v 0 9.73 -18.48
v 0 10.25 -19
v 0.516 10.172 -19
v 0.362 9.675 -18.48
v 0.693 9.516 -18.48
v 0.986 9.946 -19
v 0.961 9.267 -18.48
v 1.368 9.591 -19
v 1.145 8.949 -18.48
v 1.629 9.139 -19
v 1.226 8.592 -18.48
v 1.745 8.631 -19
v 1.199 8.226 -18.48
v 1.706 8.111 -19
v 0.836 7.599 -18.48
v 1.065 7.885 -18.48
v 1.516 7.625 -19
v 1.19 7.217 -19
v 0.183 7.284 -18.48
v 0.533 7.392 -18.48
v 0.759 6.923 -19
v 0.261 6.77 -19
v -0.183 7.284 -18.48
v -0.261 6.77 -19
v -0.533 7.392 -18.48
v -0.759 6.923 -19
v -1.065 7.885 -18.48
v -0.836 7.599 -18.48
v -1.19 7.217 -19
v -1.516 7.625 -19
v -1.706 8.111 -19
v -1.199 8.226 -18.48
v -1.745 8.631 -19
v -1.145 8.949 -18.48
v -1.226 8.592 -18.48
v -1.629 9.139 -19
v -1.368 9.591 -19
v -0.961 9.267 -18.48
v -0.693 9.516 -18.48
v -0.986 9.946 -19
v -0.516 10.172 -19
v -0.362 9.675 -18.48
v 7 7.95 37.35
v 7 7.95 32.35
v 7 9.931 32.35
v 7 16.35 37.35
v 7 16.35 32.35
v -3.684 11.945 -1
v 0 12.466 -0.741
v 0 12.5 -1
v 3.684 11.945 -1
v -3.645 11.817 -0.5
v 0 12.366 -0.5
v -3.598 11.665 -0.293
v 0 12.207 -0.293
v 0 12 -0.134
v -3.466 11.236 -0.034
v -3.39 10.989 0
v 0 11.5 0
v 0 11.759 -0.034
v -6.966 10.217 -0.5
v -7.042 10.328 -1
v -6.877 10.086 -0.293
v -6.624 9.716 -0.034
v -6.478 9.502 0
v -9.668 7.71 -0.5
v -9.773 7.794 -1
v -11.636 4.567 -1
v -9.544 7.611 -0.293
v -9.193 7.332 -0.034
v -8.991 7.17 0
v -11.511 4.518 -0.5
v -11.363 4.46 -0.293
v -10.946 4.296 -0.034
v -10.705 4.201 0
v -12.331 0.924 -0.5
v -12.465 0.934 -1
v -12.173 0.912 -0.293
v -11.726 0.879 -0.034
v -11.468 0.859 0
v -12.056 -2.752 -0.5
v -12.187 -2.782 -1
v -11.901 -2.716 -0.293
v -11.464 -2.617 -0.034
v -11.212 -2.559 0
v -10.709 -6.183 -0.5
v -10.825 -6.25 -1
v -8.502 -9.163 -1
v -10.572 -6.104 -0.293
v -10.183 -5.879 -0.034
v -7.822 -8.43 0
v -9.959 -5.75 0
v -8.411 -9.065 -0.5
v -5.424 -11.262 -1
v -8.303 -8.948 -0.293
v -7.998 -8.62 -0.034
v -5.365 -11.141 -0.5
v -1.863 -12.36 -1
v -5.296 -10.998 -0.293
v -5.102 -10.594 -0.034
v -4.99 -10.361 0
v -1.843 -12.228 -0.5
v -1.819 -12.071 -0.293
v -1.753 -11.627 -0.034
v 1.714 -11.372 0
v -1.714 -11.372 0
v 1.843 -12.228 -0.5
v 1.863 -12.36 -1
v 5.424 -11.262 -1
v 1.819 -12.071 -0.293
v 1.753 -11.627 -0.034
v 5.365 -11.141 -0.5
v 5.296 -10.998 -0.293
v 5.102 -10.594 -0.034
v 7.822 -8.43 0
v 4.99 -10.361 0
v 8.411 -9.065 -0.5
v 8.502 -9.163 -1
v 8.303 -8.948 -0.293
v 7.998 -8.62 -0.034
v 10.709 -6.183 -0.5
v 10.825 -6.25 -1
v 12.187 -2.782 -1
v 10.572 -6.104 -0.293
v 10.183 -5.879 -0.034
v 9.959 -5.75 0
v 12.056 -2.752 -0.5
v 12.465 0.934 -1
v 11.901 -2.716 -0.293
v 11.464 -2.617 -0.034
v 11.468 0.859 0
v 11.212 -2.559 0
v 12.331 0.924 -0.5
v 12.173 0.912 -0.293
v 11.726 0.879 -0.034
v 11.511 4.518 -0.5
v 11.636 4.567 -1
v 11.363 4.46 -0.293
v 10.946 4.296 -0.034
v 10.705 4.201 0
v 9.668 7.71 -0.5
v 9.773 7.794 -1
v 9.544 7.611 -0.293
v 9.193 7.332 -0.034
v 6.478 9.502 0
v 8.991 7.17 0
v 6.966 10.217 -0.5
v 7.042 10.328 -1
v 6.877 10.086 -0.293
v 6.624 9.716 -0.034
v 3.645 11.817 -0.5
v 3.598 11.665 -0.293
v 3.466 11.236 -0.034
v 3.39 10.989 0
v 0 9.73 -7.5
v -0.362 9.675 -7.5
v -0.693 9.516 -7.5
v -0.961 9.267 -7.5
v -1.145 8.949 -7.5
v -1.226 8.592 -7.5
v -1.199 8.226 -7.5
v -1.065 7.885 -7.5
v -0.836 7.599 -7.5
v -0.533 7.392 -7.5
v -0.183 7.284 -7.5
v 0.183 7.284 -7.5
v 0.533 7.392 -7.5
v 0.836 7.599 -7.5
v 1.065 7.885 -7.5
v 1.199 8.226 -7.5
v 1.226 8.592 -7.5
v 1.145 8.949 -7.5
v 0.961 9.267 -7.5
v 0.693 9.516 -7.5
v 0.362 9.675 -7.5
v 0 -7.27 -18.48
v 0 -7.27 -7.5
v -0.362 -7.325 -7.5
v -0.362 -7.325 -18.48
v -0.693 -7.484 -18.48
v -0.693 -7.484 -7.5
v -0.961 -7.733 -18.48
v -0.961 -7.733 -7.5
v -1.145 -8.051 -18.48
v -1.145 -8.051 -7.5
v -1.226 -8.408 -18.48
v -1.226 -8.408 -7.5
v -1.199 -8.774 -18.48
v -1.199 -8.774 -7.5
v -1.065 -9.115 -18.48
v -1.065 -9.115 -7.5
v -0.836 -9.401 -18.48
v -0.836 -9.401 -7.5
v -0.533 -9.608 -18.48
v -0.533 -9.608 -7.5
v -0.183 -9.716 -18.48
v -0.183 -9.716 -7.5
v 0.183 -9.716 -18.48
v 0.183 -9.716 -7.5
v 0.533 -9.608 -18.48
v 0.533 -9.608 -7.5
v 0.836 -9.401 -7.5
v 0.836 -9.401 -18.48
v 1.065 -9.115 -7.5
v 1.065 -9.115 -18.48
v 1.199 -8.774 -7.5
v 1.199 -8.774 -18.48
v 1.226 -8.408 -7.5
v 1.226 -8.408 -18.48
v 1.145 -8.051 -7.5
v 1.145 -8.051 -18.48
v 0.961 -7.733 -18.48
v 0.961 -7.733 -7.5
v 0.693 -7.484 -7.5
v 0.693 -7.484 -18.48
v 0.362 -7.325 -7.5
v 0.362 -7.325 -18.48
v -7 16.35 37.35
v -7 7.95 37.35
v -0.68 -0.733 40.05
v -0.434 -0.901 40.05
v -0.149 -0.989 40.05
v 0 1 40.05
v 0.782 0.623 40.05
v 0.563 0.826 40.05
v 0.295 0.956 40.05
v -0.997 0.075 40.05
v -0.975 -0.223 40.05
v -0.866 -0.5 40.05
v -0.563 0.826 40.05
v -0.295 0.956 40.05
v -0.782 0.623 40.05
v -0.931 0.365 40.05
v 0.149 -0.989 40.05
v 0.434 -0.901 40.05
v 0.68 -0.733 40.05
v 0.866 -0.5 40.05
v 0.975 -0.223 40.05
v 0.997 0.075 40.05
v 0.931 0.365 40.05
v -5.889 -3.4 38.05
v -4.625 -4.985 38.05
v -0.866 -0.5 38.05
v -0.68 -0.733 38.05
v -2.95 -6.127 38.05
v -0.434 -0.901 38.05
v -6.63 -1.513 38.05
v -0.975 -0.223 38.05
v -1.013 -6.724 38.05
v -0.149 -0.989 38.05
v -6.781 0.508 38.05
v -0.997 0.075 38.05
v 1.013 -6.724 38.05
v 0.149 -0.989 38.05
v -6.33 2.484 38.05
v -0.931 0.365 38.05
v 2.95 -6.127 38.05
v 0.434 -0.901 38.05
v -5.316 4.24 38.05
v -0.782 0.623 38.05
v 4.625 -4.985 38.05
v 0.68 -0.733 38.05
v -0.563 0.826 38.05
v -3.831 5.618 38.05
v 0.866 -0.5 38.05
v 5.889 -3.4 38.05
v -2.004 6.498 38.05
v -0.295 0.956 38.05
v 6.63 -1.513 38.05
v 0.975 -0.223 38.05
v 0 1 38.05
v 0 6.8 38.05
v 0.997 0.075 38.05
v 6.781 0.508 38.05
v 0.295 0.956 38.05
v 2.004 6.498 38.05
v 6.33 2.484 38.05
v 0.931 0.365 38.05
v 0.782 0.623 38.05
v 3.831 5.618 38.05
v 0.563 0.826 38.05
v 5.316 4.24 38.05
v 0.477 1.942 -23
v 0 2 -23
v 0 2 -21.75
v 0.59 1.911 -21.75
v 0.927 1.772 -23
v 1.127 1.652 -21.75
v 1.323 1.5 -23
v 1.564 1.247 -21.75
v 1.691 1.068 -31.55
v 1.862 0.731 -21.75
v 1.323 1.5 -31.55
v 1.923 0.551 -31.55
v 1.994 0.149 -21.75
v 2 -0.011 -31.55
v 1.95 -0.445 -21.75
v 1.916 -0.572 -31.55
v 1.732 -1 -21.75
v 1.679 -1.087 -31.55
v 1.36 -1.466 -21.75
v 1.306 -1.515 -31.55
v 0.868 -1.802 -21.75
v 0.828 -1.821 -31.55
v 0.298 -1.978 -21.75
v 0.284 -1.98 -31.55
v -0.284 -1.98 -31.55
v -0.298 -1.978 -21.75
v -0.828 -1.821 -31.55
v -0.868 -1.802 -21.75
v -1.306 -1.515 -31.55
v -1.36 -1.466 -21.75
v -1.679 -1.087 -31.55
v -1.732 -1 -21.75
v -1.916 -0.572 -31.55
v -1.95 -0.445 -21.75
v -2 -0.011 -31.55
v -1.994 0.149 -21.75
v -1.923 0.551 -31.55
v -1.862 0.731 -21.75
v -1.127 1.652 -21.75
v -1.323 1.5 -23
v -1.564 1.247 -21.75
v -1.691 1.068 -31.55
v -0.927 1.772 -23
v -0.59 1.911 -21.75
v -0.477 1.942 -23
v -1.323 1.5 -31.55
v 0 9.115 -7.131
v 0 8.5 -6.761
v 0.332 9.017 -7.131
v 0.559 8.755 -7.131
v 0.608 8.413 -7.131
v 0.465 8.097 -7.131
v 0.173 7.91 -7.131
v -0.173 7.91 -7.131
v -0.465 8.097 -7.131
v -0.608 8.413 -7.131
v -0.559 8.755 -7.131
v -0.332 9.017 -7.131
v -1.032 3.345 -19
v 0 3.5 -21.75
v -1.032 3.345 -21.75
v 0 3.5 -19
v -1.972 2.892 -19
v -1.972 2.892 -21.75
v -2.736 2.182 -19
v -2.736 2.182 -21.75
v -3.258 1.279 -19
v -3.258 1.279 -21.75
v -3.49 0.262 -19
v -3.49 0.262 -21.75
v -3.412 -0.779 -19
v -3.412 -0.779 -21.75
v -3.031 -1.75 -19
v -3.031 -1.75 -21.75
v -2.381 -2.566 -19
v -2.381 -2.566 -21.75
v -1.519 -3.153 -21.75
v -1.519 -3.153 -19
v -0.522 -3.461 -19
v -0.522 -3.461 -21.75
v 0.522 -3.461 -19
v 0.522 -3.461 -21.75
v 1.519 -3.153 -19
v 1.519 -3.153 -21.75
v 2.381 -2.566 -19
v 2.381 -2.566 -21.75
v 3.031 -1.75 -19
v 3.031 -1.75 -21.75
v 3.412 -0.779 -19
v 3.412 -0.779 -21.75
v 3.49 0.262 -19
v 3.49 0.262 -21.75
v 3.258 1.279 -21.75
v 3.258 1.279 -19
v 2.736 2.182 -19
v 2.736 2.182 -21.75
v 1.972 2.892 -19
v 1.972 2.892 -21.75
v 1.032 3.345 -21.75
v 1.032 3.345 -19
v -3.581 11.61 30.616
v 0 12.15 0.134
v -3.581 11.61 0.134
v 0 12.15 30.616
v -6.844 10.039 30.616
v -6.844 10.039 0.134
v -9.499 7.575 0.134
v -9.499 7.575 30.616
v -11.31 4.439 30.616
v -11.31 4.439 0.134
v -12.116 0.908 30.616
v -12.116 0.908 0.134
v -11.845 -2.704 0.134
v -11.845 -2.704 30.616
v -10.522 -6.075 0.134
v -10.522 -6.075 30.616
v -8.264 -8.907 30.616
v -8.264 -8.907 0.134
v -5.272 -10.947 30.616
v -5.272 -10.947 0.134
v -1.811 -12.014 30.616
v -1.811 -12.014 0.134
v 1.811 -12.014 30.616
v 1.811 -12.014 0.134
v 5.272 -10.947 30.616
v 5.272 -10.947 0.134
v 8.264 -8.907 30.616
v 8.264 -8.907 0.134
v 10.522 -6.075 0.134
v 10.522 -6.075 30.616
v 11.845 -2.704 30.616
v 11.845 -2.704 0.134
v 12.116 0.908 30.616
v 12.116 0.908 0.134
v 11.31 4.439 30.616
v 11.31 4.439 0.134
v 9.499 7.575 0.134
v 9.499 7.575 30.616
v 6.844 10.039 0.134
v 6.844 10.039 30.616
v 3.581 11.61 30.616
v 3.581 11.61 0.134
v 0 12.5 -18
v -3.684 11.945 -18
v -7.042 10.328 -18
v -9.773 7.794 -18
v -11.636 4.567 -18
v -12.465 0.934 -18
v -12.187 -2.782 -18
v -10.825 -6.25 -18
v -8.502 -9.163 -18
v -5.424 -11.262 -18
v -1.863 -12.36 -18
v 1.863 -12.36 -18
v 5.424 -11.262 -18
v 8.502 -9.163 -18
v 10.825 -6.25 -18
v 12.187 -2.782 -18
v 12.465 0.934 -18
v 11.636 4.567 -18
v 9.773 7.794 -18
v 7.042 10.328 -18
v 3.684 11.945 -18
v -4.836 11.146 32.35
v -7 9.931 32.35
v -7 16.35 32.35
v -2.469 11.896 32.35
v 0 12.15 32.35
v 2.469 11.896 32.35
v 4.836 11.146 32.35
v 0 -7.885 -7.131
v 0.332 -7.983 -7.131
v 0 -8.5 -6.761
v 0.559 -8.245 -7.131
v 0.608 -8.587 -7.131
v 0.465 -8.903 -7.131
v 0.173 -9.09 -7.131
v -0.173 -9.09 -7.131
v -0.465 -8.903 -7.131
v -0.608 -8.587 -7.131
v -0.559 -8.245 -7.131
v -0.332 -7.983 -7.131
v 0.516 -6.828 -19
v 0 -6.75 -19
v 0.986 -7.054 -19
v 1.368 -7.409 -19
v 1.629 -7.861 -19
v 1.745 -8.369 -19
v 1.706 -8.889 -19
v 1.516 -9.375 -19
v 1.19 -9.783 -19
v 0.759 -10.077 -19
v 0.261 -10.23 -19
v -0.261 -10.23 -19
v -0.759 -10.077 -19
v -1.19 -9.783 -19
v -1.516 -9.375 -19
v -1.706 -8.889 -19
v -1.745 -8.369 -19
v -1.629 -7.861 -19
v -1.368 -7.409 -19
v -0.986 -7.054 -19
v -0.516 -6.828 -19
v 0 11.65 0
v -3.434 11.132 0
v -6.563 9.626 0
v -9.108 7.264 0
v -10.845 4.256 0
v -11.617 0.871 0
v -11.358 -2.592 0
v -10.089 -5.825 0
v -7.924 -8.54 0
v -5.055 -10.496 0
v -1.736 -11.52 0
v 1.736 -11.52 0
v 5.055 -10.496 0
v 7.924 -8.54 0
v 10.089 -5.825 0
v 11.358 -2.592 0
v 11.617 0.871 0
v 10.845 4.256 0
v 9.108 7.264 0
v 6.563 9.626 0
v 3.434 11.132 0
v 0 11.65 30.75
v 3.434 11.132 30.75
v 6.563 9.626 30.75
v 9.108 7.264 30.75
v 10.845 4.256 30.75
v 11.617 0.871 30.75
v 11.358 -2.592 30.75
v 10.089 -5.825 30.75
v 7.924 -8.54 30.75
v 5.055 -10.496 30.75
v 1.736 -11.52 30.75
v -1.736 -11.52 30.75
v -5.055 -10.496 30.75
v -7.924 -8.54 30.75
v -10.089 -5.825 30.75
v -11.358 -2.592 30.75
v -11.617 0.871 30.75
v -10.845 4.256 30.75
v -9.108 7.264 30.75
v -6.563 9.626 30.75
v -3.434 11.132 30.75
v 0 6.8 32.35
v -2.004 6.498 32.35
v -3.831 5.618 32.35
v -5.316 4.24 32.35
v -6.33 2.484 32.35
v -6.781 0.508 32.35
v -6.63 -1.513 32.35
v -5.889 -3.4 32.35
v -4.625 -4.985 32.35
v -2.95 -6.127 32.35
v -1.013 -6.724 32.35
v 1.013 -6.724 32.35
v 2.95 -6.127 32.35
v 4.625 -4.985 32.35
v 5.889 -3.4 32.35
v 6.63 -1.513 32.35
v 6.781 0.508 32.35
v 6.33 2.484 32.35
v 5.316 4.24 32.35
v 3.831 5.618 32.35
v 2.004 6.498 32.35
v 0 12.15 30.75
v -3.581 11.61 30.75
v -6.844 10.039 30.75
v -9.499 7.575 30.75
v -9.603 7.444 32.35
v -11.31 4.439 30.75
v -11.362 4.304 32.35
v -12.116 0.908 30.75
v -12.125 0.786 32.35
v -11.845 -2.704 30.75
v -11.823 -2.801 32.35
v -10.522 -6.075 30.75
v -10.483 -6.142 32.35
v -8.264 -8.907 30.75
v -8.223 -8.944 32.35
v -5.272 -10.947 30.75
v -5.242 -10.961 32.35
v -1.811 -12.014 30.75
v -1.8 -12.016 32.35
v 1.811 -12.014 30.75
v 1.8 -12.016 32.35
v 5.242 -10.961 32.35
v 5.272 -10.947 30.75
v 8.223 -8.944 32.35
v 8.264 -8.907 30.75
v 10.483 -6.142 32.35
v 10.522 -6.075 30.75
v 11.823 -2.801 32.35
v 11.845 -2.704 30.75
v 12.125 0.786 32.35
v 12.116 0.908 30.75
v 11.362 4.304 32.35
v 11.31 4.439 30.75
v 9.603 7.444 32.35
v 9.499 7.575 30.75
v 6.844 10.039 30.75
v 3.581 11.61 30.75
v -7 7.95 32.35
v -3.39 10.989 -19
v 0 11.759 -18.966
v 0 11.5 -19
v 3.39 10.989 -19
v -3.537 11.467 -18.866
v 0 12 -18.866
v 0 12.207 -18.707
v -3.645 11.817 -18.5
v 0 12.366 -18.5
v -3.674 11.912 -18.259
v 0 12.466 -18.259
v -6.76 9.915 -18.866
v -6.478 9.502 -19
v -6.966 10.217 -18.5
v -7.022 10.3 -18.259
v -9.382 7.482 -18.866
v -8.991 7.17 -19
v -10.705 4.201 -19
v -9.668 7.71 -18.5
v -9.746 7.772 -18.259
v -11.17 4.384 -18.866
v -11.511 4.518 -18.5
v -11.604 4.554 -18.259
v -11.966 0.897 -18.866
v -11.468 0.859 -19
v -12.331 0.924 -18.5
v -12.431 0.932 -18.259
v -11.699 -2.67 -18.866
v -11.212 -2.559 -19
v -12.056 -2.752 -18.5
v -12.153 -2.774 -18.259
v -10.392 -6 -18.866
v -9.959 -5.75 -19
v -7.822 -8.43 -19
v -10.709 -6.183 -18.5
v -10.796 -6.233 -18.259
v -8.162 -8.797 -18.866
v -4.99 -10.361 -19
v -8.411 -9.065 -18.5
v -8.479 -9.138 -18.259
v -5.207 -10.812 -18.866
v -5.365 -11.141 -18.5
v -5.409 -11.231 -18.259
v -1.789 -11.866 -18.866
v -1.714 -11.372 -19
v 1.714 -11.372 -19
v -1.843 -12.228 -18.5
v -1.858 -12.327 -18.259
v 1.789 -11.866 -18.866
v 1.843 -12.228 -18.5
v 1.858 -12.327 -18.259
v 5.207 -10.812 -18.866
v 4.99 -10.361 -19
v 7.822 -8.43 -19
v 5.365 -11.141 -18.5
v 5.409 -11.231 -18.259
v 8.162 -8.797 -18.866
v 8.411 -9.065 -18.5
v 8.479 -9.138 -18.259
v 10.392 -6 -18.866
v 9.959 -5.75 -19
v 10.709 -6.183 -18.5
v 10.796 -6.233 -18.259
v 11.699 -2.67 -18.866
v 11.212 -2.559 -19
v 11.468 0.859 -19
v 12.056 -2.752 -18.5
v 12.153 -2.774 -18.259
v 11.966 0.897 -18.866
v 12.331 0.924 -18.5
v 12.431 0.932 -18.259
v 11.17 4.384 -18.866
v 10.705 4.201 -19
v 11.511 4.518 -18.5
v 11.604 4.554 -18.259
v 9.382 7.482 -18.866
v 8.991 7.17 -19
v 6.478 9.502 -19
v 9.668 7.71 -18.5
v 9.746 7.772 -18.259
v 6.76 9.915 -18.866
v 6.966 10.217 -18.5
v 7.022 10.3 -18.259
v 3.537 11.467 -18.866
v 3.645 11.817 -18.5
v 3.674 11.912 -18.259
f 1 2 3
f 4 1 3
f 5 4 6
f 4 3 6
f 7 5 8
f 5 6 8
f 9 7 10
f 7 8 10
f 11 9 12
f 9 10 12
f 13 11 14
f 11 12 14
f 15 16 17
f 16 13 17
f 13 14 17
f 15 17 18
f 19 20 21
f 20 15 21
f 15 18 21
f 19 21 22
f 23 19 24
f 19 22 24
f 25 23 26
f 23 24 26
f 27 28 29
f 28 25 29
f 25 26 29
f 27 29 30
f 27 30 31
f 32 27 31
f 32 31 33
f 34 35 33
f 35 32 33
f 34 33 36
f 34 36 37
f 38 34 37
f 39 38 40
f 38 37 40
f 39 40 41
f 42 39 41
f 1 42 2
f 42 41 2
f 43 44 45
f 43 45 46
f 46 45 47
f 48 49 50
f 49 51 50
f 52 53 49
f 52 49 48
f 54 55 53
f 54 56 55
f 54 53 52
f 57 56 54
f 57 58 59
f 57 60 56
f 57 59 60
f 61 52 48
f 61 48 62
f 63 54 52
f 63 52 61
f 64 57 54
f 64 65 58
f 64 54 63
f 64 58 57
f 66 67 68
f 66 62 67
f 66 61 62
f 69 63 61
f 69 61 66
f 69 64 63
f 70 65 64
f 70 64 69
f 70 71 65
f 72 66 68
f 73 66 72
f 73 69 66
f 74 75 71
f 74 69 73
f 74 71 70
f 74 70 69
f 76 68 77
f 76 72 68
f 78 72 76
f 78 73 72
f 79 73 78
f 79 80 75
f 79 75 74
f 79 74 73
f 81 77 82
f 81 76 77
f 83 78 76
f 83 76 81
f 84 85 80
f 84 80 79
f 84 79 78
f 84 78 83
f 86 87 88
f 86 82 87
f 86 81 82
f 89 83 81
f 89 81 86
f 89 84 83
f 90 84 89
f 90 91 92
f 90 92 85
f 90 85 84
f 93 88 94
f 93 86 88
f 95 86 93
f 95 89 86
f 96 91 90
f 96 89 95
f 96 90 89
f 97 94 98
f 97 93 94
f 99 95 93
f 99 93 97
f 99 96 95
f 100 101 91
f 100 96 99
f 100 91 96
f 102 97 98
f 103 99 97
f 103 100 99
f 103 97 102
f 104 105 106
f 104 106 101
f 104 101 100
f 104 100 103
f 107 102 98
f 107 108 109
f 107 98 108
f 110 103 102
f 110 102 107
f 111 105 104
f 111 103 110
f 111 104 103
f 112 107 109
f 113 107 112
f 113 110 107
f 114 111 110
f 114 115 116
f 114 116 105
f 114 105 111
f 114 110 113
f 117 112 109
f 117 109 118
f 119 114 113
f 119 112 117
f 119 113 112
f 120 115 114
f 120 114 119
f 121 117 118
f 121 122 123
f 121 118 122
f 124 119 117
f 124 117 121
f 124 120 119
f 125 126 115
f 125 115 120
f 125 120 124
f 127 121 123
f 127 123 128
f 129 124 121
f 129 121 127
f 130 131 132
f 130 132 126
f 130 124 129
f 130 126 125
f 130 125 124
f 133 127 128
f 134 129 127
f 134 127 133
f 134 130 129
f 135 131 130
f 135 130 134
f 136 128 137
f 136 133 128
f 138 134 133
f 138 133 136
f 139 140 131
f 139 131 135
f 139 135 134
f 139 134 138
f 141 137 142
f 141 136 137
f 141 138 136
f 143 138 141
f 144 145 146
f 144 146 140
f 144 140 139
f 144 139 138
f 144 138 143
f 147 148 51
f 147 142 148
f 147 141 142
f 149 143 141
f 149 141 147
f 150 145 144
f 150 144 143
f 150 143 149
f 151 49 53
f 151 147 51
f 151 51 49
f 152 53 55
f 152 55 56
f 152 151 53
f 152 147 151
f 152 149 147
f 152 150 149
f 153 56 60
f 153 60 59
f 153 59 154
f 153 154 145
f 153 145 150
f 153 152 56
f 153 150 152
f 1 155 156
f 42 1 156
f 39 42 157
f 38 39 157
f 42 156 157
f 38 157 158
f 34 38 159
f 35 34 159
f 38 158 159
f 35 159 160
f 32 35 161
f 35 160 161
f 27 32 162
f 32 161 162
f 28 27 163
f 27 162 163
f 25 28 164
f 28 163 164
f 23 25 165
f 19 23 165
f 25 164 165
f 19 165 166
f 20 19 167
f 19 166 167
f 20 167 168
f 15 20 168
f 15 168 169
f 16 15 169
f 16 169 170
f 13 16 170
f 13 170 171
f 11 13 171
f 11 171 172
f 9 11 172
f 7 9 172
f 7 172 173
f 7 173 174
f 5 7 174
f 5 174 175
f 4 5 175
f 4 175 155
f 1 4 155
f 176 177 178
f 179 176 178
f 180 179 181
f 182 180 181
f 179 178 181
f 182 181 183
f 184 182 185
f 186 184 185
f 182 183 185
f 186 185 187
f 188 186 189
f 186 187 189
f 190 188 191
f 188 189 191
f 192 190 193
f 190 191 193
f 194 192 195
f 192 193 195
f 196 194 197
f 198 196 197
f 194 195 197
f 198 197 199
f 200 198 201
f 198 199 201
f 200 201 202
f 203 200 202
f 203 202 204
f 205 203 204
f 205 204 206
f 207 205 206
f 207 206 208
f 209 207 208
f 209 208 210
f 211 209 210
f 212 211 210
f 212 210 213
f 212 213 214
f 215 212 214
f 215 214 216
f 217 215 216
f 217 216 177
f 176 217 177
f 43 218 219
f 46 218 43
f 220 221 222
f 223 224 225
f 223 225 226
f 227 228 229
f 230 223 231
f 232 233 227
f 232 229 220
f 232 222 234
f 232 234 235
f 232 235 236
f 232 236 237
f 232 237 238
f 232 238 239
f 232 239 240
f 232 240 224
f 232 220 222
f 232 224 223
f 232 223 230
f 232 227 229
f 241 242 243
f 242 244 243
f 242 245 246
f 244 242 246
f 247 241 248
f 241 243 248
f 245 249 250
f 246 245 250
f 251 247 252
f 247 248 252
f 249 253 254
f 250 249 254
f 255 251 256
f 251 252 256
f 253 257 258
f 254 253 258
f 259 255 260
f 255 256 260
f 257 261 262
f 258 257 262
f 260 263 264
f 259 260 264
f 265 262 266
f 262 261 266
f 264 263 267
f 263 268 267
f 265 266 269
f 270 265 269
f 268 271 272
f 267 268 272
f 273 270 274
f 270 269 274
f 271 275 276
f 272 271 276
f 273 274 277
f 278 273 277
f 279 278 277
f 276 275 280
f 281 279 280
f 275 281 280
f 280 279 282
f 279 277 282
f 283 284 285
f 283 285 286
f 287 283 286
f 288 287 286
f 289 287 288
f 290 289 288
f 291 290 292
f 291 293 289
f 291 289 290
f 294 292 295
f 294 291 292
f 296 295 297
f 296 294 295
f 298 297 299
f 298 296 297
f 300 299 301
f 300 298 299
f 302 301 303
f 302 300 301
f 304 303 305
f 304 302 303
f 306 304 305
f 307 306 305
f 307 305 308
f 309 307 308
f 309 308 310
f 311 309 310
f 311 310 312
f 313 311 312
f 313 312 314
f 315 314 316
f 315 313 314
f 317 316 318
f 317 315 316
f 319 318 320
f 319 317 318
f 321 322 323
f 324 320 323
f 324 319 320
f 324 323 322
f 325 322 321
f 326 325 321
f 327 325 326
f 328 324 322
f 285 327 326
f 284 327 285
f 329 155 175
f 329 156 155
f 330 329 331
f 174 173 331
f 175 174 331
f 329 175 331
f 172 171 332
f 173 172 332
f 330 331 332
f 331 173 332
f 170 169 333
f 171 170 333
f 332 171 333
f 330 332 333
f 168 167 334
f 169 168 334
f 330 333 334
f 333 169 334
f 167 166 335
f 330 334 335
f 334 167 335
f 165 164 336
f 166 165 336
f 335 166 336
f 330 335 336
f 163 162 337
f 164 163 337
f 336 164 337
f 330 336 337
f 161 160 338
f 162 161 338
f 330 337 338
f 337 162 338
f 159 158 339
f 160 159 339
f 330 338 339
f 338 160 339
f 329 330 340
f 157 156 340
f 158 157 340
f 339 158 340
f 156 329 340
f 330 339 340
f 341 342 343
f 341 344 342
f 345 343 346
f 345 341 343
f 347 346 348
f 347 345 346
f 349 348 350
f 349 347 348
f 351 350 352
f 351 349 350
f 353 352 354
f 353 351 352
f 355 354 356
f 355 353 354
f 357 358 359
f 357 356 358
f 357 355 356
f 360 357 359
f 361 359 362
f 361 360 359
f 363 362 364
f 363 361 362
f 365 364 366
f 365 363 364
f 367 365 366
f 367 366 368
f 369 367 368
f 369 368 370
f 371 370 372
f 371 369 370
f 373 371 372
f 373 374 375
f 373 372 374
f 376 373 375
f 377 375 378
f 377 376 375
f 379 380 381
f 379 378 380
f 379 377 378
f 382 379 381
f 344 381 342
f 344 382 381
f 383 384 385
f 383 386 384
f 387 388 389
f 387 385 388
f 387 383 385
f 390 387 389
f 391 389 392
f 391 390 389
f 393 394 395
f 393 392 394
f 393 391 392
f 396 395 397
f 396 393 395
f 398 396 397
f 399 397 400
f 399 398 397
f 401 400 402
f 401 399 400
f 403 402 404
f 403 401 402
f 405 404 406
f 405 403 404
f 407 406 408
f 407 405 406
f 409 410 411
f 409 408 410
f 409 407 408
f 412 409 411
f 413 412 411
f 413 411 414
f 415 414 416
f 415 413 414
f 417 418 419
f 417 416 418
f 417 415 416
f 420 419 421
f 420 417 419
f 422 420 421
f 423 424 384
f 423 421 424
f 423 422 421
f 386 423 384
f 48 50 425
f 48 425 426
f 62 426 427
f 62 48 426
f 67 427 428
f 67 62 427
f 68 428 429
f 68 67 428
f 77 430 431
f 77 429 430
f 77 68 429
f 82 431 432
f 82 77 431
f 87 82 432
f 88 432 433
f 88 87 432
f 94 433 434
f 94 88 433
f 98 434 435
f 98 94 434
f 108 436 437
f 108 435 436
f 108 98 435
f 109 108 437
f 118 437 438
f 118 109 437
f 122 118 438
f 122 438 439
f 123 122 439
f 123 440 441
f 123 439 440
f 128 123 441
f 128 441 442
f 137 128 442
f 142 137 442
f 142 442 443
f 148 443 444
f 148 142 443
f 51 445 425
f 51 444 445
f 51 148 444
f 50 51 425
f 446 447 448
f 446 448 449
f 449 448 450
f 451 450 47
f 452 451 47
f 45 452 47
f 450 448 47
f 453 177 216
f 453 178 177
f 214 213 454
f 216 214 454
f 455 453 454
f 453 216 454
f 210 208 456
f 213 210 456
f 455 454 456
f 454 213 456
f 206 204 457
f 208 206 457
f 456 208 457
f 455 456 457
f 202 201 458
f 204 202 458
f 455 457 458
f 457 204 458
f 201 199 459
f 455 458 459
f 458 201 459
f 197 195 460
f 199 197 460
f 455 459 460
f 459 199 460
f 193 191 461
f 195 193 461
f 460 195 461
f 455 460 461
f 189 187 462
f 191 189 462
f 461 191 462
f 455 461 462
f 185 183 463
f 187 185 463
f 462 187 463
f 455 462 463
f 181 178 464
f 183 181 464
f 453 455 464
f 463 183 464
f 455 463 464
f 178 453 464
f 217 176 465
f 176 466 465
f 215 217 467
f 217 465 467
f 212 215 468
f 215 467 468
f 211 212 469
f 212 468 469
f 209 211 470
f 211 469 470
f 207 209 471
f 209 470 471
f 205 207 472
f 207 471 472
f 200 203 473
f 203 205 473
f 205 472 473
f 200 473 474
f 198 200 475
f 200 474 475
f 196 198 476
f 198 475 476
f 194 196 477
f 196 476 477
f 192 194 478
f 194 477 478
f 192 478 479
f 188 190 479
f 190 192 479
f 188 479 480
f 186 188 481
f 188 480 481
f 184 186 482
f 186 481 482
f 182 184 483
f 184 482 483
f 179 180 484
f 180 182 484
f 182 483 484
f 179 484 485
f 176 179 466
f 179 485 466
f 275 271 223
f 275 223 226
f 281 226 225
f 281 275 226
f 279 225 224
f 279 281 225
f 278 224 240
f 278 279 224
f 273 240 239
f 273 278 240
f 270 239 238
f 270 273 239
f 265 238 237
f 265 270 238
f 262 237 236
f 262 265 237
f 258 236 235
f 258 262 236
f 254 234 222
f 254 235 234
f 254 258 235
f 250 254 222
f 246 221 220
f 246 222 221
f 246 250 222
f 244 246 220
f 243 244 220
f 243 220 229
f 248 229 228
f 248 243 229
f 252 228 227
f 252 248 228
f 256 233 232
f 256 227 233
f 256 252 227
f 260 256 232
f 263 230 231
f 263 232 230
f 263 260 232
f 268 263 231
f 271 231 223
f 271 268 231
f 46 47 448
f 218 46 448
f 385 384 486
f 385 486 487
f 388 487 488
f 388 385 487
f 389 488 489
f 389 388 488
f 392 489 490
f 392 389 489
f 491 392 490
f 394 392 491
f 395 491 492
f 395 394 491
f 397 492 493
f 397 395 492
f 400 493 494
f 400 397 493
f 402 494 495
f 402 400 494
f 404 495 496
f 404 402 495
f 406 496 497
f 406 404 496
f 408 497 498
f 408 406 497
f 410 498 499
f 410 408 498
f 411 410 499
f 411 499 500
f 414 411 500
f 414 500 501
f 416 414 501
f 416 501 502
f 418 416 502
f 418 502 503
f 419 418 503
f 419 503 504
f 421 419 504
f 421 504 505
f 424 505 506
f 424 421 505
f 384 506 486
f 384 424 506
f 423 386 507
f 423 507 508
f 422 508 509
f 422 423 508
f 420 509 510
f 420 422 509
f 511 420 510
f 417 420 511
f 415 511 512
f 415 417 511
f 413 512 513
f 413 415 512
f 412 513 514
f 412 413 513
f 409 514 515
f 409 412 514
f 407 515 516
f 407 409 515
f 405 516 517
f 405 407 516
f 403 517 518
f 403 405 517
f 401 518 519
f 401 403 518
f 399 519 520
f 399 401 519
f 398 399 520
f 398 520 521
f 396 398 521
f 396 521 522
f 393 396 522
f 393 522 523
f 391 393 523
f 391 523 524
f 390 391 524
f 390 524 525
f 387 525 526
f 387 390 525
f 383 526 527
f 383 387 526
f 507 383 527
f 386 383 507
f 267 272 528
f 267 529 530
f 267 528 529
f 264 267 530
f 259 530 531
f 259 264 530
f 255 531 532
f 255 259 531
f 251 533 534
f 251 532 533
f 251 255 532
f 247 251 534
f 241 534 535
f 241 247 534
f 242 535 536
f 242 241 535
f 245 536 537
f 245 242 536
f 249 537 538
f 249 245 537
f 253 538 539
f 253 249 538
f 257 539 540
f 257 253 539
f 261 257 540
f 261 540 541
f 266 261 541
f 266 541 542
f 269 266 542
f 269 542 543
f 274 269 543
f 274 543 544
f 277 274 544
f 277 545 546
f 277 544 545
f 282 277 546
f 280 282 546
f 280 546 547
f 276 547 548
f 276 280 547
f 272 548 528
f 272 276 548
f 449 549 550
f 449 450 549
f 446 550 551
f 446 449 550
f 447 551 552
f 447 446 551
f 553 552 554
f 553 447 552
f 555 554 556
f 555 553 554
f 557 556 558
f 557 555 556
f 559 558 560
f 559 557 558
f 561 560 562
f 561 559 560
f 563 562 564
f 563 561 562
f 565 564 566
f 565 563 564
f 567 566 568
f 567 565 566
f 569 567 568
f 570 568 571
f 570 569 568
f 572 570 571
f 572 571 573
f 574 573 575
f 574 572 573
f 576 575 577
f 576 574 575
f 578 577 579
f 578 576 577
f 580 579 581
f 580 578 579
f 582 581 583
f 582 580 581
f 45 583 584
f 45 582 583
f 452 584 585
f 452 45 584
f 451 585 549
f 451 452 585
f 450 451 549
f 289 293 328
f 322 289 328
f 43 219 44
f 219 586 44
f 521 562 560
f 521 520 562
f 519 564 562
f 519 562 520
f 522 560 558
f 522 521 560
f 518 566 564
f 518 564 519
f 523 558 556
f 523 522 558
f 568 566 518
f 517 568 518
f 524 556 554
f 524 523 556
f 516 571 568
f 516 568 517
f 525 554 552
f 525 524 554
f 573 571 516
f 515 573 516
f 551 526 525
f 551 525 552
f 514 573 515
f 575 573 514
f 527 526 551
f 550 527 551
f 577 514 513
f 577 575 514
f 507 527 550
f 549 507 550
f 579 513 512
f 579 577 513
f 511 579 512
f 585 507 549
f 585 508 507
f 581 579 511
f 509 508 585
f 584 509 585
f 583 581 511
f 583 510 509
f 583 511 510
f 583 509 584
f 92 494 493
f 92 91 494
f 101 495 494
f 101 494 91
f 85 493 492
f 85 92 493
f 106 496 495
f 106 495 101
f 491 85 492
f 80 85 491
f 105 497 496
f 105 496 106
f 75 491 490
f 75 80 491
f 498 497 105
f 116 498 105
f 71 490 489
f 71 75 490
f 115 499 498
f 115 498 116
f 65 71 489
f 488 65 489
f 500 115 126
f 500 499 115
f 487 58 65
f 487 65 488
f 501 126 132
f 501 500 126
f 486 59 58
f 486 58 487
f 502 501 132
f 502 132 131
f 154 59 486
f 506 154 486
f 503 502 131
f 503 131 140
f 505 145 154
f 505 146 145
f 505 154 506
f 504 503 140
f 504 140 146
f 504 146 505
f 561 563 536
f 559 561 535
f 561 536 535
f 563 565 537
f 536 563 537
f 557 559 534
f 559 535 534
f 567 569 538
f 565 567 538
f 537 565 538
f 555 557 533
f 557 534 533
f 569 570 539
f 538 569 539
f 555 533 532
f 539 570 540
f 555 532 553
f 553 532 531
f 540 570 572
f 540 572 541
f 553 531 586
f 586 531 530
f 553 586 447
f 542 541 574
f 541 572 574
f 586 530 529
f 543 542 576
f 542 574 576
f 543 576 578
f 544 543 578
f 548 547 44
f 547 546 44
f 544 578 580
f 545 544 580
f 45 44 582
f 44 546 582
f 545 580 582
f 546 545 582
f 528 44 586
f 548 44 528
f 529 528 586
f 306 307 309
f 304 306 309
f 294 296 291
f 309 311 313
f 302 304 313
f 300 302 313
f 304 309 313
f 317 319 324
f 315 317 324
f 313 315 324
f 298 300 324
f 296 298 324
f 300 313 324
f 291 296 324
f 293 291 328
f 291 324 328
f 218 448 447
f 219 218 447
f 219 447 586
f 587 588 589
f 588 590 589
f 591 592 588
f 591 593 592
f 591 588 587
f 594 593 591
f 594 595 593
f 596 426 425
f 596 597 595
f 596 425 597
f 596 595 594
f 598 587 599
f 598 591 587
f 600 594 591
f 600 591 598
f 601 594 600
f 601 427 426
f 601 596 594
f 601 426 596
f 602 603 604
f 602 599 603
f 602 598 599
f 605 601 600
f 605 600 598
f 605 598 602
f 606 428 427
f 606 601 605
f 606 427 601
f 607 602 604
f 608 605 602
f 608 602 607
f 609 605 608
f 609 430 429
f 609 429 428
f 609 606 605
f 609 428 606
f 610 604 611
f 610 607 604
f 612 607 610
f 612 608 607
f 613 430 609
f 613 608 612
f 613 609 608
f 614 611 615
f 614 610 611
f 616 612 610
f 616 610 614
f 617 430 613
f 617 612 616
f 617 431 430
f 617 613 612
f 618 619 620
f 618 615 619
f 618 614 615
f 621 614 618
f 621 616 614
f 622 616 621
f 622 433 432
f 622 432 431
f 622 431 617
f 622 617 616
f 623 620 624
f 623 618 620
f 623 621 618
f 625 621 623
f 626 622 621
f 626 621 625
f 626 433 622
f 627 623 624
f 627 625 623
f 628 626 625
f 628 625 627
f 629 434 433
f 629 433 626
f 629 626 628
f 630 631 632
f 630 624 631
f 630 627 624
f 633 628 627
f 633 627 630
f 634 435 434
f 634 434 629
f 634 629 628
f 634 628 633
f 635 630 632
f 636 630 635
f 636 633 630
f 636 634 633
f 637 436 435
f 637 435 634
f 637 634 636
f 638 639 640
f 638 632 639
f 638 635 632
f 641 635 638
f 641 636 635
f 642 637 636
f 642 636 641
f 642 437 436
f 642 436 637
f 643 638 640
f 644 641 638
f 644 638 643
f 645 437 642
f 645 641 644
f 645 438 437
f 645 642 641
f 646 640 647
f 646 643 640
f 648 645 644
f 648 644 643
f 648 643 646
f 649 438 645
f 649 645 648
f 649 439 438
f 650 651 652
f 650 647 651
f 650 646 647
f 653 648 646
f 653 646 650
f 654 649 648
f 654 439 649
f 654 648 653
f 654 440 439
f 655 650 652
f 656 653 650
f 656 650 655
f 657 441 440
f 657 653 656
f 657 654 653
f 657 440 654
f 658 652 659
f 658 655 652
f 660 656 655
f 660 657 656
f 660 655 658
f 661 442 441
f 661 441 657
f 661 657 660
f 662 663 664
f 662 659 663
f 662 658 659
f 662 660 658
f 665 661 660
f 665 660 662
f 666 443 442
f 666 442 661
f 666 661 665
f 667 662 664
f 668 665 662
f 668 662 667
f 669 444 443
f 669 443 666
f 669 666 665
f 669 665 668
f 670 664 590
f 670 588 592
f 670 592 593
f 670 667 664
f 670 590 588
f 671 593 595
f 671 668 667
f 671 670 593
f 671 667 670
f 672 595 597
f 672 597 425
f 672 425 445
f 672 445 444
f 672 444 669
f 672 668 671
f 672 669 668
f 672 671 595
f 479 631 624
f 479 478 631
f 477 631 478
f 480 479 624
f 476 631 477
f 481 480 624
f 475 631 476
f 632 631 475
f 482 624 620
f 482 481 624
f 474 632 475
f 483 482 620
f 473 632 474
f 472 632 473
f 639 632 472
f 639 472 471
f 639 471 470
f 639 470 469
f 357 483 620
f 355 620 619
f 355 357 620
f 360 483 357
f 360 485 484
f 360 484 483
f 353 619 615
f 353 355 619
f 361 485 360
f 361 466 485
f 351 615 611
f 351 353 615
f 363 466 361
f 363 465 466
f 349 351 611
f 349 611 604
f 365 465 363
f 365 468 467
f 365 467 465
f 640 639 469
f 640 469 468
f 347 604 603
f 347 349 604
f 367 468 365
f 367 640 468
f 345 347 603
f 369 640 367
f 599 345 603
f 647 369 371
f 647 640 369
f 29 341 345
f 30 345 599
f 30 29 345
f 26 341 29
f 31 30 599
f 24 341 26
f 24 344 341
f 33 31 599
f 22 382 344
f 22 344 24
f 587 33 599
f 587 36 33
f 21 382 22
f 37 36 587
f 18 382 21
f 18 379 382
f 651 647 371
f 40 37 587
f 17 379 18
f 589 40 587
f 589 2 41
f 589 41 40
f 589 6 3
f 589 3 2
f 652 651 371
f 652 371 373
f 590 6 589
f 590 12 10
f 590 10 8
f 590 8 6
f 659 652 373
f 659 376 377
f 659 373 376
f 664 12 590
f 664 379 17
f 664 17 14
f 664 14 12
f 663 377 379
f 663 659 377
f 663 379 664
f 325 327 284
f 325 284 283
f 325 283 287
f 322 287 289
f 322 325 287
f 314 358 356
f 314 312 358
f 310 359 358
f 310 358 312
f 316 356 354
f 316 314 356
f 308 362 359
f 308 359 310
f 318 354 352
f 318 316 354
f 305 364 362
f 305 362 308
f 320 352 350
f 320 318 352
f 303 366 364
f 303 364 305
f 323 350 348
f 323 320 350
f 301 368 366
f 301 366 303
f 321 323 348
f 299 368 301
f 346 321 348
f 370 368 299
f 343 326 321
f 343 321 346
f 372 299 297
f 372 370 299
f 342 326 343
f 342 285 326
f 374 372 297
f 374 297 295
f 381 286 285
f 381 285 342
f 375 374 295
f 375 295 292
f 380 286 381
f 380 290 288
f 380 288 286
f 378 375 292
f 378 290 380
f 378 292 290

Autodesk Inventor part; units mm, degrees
ref_plane "YZ Plane" through (0, 0, 0) normal (1, 0, 0) x (0, 1, 0)
ref_plane "XZ Plane" through (0, 0, 0) normal (0, 1, 0) x (-1, 0, 0)
ref_plane "XY Plane" through (0, 0, 0) normal (0, 0, 1) x (1, 0, 0)
sketch "Эскиз1" plane through (0, 0, 0) normal (1, 0, 0) x (0, 1, 0)
  line L0 (0, 0) -> (11.15, 0)
  line L1 (12.15, 0.134) -> (12.15, 30.616)
  line L2 (12.15, 30.75) -> (11.65, 30.75)
  line L3 (11.65, 30.75) -> (12.15, 30.616)
  line L4 (11.65, 30.75) -> (12.7154, 30.75) construction
  line L5 (12.15, 30.75) -> (12.15, 32.35)
  line L6 (12.15, 32.35) -> (0, 32.35)
  line L7 (11.65, 30.75) -> (0, 30.75)
  line L8 (0, 32.35) -> (0, 0)
  line L9 (12.15, 0) -> (11.65, 0)
  line L10 (11.65, 0) -> (12.15, 0.134)
  line L11 (0, 32.35) -> (6.8, 32.35)
  line L12 (6.8, 32.35) -> (6.8, 38.05)
  line L13 (6.8, 38.05) -> (0, 38.05)
  line L14 (0, 38.05) -> (0, 32.35)
  line L15 (0, 38.05) -> (0, 40.05)
  line L16 (0, 40.05) -> (1, 40.05)
  line L17 (1, 40.05) -> (1, 38.05)
  line L18 (11.65, 0) -> (12.15, 0)
  line L19 (0, 0) -> (0, -19)
  line L20 (0, -19) -> (0, -21.75)
  line L21 (0, -21.75) -> (3.5, -21.75)
  line L22 (3.5, -21.75) -> (3.5, -19)
  line L23 (0, -21.75) -> (2, -21.75)
  line L24 (2, -21.75) -> (2, -31.55)
  line L25 (2, -31.55) -> (0, -31.55)
  line L26 (0, -31.55) -> (0, -21.75)
  line L27 (11.65, 0) -> (11.15, 0)
  line L28 (0, -19) -> (11.5, -19)
  line L29 (12.5, -18) -> (12.5, -1)
  line L30 (11.5, 0) -> (11.65, 0)
  arc A0 (12.5, -1) -> (11.5, 0) centre (11.5, -1) ccw
  arc A1 (11.5, -19) -> (12.5, -18) centre (11.5, -18) ccw
  point P0 (12.5, -19)
  dimension "d0" = 12.15
  dimension "d1" = 30.75
  dimension "d2" = 0.5
  dimension "d4" = 15
  dimension "d5" = 1.6
  dimension "d6" = 0.5
  dimension "d7" = 15
  dimension "d8" = 6.8
  dimension "d9" = 5.7
  dimension "d10" = 2
  dimension "d11" = 1
  dimension "d13" = 2.75
  dimension "d14" = 3.5
  dimension "d15" = 2
  dimension "d16" = 9.8
  dimension "d23" = 12.5
  dimension "d24" = 1
revolve "Вращение1" add sketch "Эскиз1" angle 360 about axis through (0, 0, 38.05) along (0, 0, 1) contours L15 L16 L17 L13
revolve "Вращение2" add sketch "Эскиз1" angle 360 about axis through (0, 0, 38.05) along (0, 0, -1) contours L14 L13 L12 L6
revolve "Вращение3" add sketch "Эскиз1" angle 360 about axis through (0, 0, 32.35) along (0, 0, -1) contours L8 L6 L5 L2 L7
revolve "Вращение4" add sketch "Эскиз1" angle 360 about axis through (0, 0, 32.35) along (0, 0, -1) contours L8 L7 L3 L1 L10 L27 L0
revolve "Вращение5" add sketch "Эскиз1" angle 360 about axis through (0, 0, 0) along (0, 0, -1) contours L0 L27 A0 L29 A1 L28 L19
revolve "Вращение6" add sketch "Эскиз1" angle 360 about axis through (0, 0, -19) along (0, 0, -1) contours L28 L22 L21 L20
revolve "Вращение7" add sketch "Эскиз1" angle 360 about axis through (0, 0, -31.55) along (0, 0, 1) contours L21 L24 L25 L26
sketch "Эскиз2" plane through (0, 0, 32.35) normal (0, 0, 1) x (1, 0, 0)
  line L0 (-7, 7.95) -> (7, 7.95)
  line L1 (7, 7.95) -> (7, 16.35)
  line L2 (7, 16.35) -> (-7, 16.35)
  line L3 (-7, 16.35) -> (-7, 7.95)
  line L4 (-7, 7.95) -> (7, 16.35) construction
  line L5 (7, 7.95) -> (-7, 16.35) construction
  circle A0 centre (0, 0) radius 12.15 projected
  point P0 (0, 12.15)
  dimension "d28" = 14
  dimension "d29" = 8.4
extrude "Выдавливание1" add sketch "Эскиз2" along normal blind 5 contours L3 A0 L1 L0 | L3 L2 L1 A0 picked at (-0.4961, 9.3195)
sketch "Эскиз3" plane through (0, 0, -31.55) normal (0, 0, -1) x (-1, 0, 0)
  line L0 (-1.8903, 1.5) -> (1.8903, 1.5)
  line L1 (1.8903, 1.5) -> (1.8903, 3.1362)
  line L2 (1.8903, 3.1362) -> (-1.8903, 3.1362)
  line L3 (-1.8903, 3.1362) -> (-1.8903, 1.5)
  line L4 (-1.8903, 1.5) -> (1.8903, 3.1362) construction
  line L5 (1.8903, 1.5) -> (-1.8903, 3.1362) construction
  circle A0 centre (0, 0) radius 2 projected
  point P0 (0, 2.3181)
  dimension "d32" = 1.5
extrude "Выдавливание2" cut sketch "Эскиз3" against normal blind 8.55 contours L3 L2 L1 L0 A0 | A0 L0 picked at (0, 1.6667)
sketch "Эскиз4" plane through (0, 0, -19) normal (0, 0, -1) x (-1, 0, 0)
  circle A0 centre (0, 0) radius 3.5 projected
  circle A1 centre (0, 0) radius 11.5 projected
  circle A2 centre (0, 8.5) radius 0.4758
  line L0 (-17.5, 0) -> (17.5, 0) projected
  circle A3 centre (0, -8.5) radius 0.4758
  dimension "d35" = 8.5
hole "Отверстие1" at (0, 8.5, -19) at (0, -8.5, -19) direction (0, 0, 1) diameter 2.459 depth 11.5 tip angle 118 countersink diameter 3.5 countersink angle 90 thread size "M3x0.5" class "6H" standard "ISO Metric profile"
properties part number "servo"
